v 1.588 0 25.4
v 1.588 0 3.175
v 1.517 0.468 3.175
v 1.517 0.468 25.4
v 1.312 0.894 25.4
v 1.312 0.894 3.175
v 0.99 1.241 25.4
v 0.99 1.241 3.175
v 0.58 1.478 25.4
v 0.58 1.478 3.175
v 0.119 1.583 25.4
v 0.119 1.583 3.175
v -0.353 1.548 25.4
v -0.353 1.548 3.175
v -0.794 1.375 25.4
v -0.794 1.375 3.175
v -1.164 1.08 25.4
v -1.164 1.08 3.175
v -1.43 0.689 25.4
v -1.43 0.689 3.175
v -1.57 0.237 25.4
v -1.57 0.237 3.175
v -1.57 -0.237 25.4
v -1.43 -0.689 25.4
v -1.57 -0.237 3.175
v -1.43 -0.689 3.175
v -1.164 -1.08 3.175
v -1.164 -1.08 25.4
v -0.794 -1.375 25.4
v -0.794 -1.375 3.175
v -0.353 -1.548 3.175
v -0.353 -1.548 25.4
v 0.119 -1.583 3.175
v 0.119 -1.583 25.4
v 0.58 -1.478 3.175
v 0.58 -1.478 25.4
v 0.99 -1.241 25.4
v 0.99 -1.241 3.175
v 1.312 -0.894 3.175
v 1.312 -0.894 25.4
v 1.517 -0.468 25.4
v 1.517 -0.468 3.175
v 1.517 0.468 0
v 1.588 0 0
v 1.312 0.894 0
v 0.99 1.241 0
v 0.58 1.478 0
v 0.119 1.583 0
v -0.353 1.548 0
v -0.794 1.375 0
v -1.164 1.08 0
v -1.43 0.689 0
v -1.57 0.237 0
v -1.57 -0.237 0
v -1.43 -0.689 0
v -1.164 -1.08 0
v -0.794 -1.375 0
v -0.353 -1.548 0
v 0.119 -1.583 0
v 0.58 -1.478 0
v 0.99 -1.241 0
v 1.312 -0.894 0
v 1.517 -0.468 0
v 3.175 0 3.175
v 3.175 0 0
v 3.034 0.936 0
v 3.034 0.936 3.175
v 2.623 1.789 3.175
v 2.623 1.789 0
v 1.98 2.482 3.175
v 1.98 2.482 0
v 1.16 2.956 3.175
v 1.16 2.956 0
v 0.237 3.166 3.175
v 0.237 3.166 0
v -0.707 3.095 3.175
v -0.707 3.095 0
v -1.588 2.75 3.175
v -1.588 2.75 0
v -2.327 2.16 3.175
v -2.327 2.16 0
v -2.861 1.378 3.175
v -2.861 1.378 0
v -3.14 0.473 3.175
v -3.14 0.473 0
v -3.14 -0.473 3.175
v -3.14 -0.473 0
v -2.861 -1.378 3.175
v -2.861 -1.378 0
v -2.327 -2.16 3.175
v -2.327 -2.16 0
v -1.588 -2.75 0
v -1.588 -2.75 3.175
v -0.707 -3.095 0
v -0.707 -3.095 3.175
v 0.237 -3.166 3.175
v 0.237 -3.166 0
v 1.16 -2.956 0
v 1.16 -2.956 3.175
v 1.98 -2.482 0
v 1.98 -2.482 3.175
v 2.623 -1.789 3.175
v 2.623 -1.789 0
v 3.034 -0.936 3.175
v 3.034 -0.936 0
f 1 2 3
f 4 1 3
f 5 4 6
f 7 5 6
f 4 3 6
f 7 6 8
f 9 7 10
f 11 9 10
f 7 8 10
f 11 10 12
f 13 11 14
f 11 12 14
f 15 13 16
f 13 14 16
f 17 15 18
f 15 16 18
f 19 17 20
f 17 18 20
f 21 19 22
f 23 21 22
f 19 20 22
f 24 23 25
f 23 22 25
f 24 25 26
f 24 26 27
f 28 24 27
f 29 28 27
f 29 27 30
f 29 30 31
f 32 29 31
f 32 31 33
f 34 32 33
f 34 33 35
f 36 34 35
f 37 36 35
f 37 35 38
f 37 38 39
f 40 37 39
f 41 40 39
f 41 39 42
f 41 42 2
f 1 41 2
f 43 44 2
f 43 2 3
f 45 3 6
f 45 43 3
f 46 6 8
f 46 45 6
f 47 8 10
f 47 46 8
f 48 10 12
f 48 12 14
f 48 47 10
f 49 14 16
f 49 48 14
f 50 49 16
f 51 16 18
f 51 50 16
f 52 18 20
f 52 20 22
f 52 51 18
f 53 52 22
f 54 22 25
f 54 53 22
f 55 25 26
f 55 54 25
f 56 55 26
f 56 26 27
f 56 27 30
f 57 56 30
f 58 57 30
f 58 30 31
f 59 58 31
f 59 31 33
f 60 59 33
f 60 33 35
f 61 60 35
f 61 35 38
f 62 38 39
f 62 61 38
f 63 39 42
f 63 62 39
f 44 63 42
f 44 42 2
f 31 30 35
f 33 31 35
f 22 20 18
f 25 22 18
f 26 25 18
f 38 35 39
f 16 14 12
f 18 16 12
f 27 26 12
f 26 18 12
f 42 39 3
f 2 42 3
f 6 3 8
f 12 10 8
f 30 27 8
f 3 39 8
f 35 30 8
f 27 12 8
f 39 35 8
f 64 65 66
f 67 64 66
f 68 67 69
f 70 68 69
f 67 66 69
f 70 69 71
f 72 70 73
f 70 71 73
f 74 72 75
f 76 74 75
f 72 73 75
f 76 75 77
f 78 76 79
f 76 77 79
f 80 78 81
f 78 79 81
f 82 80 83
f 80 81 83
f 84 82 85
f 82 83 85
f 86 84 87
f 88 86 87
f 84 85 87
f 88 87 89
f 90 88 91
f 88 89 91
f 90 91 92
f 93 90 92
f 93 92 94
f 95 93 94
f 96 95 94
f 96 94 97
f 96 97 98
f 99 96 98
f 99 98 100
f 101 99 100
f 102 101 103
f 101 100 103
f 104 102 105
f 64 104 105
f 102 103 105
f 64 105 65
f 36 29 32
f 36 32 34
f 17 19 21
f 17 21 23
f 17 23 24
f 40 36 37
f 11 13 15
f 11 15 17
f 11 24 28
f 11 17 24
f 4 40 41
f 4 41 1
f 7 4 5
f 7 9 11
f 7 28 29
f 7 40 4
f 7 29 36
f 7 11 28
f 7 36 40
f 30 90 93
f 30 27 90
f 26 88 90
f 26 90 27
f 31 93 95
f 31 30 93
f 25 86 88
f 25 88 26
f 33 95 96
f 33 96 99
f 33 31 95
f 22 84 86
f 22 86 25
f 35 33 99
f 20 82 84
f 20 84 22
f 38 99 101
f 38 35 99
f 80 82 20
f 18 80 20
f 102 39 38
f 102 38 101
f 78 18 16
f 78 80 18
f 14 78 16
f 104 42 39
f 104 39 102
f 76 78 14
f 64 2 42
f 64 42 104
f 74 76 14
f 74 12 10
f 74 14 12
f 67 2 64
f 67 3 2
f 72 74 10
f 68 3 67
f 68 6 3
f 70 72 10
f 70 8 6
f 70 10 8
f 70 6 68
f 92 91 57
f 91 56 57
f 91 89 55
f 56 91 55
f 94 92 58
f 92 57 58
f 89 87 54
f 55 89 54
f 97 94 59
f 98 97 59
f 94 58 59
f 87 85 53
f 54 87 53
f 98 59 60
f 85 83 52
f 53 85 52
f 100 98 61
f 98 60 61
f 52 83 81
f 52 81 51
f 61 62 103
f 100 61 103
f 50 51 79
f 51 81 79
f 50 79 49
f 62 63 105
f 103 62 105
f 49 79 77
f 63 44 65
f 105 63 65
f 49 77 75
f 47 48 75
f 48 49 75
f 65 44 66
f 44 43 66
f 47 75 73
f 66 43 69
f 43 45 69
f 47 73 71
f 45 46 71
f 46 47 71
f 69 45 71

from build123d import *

# Parameters (mm, degrees)
F0_R     = 1.5875
F1_DEPTH = 25.4
F2_R     = 3.175
F2_R_2   = 1.5875
F3_DEPTH = 3.175
F4_DEPTH = 3.175


with BuildPart() as f1:
    # F0 (on Top) → F1 (new body)
    with BuildSketch(Plane.XY):
        Circle(F0_R)
    extrude(amount=F1_DEPTH)

    # F2 (on Top) → F3 (join)
    with BuildSketch(Plane.XY):
        Circle(F2_R)
        Circle(F2_R_2, mode=Mode.SUBTRACT)
    extrude(amount=F3_DEPTH)

    # F0 (on Top) → F4 (cut)
    with BuildSketch(Plane.XY):
        Circle(F0_R)
    extrude(amount=F4_DEPTH, mode=Mode.SUBTRACT)


solid = f1.part
